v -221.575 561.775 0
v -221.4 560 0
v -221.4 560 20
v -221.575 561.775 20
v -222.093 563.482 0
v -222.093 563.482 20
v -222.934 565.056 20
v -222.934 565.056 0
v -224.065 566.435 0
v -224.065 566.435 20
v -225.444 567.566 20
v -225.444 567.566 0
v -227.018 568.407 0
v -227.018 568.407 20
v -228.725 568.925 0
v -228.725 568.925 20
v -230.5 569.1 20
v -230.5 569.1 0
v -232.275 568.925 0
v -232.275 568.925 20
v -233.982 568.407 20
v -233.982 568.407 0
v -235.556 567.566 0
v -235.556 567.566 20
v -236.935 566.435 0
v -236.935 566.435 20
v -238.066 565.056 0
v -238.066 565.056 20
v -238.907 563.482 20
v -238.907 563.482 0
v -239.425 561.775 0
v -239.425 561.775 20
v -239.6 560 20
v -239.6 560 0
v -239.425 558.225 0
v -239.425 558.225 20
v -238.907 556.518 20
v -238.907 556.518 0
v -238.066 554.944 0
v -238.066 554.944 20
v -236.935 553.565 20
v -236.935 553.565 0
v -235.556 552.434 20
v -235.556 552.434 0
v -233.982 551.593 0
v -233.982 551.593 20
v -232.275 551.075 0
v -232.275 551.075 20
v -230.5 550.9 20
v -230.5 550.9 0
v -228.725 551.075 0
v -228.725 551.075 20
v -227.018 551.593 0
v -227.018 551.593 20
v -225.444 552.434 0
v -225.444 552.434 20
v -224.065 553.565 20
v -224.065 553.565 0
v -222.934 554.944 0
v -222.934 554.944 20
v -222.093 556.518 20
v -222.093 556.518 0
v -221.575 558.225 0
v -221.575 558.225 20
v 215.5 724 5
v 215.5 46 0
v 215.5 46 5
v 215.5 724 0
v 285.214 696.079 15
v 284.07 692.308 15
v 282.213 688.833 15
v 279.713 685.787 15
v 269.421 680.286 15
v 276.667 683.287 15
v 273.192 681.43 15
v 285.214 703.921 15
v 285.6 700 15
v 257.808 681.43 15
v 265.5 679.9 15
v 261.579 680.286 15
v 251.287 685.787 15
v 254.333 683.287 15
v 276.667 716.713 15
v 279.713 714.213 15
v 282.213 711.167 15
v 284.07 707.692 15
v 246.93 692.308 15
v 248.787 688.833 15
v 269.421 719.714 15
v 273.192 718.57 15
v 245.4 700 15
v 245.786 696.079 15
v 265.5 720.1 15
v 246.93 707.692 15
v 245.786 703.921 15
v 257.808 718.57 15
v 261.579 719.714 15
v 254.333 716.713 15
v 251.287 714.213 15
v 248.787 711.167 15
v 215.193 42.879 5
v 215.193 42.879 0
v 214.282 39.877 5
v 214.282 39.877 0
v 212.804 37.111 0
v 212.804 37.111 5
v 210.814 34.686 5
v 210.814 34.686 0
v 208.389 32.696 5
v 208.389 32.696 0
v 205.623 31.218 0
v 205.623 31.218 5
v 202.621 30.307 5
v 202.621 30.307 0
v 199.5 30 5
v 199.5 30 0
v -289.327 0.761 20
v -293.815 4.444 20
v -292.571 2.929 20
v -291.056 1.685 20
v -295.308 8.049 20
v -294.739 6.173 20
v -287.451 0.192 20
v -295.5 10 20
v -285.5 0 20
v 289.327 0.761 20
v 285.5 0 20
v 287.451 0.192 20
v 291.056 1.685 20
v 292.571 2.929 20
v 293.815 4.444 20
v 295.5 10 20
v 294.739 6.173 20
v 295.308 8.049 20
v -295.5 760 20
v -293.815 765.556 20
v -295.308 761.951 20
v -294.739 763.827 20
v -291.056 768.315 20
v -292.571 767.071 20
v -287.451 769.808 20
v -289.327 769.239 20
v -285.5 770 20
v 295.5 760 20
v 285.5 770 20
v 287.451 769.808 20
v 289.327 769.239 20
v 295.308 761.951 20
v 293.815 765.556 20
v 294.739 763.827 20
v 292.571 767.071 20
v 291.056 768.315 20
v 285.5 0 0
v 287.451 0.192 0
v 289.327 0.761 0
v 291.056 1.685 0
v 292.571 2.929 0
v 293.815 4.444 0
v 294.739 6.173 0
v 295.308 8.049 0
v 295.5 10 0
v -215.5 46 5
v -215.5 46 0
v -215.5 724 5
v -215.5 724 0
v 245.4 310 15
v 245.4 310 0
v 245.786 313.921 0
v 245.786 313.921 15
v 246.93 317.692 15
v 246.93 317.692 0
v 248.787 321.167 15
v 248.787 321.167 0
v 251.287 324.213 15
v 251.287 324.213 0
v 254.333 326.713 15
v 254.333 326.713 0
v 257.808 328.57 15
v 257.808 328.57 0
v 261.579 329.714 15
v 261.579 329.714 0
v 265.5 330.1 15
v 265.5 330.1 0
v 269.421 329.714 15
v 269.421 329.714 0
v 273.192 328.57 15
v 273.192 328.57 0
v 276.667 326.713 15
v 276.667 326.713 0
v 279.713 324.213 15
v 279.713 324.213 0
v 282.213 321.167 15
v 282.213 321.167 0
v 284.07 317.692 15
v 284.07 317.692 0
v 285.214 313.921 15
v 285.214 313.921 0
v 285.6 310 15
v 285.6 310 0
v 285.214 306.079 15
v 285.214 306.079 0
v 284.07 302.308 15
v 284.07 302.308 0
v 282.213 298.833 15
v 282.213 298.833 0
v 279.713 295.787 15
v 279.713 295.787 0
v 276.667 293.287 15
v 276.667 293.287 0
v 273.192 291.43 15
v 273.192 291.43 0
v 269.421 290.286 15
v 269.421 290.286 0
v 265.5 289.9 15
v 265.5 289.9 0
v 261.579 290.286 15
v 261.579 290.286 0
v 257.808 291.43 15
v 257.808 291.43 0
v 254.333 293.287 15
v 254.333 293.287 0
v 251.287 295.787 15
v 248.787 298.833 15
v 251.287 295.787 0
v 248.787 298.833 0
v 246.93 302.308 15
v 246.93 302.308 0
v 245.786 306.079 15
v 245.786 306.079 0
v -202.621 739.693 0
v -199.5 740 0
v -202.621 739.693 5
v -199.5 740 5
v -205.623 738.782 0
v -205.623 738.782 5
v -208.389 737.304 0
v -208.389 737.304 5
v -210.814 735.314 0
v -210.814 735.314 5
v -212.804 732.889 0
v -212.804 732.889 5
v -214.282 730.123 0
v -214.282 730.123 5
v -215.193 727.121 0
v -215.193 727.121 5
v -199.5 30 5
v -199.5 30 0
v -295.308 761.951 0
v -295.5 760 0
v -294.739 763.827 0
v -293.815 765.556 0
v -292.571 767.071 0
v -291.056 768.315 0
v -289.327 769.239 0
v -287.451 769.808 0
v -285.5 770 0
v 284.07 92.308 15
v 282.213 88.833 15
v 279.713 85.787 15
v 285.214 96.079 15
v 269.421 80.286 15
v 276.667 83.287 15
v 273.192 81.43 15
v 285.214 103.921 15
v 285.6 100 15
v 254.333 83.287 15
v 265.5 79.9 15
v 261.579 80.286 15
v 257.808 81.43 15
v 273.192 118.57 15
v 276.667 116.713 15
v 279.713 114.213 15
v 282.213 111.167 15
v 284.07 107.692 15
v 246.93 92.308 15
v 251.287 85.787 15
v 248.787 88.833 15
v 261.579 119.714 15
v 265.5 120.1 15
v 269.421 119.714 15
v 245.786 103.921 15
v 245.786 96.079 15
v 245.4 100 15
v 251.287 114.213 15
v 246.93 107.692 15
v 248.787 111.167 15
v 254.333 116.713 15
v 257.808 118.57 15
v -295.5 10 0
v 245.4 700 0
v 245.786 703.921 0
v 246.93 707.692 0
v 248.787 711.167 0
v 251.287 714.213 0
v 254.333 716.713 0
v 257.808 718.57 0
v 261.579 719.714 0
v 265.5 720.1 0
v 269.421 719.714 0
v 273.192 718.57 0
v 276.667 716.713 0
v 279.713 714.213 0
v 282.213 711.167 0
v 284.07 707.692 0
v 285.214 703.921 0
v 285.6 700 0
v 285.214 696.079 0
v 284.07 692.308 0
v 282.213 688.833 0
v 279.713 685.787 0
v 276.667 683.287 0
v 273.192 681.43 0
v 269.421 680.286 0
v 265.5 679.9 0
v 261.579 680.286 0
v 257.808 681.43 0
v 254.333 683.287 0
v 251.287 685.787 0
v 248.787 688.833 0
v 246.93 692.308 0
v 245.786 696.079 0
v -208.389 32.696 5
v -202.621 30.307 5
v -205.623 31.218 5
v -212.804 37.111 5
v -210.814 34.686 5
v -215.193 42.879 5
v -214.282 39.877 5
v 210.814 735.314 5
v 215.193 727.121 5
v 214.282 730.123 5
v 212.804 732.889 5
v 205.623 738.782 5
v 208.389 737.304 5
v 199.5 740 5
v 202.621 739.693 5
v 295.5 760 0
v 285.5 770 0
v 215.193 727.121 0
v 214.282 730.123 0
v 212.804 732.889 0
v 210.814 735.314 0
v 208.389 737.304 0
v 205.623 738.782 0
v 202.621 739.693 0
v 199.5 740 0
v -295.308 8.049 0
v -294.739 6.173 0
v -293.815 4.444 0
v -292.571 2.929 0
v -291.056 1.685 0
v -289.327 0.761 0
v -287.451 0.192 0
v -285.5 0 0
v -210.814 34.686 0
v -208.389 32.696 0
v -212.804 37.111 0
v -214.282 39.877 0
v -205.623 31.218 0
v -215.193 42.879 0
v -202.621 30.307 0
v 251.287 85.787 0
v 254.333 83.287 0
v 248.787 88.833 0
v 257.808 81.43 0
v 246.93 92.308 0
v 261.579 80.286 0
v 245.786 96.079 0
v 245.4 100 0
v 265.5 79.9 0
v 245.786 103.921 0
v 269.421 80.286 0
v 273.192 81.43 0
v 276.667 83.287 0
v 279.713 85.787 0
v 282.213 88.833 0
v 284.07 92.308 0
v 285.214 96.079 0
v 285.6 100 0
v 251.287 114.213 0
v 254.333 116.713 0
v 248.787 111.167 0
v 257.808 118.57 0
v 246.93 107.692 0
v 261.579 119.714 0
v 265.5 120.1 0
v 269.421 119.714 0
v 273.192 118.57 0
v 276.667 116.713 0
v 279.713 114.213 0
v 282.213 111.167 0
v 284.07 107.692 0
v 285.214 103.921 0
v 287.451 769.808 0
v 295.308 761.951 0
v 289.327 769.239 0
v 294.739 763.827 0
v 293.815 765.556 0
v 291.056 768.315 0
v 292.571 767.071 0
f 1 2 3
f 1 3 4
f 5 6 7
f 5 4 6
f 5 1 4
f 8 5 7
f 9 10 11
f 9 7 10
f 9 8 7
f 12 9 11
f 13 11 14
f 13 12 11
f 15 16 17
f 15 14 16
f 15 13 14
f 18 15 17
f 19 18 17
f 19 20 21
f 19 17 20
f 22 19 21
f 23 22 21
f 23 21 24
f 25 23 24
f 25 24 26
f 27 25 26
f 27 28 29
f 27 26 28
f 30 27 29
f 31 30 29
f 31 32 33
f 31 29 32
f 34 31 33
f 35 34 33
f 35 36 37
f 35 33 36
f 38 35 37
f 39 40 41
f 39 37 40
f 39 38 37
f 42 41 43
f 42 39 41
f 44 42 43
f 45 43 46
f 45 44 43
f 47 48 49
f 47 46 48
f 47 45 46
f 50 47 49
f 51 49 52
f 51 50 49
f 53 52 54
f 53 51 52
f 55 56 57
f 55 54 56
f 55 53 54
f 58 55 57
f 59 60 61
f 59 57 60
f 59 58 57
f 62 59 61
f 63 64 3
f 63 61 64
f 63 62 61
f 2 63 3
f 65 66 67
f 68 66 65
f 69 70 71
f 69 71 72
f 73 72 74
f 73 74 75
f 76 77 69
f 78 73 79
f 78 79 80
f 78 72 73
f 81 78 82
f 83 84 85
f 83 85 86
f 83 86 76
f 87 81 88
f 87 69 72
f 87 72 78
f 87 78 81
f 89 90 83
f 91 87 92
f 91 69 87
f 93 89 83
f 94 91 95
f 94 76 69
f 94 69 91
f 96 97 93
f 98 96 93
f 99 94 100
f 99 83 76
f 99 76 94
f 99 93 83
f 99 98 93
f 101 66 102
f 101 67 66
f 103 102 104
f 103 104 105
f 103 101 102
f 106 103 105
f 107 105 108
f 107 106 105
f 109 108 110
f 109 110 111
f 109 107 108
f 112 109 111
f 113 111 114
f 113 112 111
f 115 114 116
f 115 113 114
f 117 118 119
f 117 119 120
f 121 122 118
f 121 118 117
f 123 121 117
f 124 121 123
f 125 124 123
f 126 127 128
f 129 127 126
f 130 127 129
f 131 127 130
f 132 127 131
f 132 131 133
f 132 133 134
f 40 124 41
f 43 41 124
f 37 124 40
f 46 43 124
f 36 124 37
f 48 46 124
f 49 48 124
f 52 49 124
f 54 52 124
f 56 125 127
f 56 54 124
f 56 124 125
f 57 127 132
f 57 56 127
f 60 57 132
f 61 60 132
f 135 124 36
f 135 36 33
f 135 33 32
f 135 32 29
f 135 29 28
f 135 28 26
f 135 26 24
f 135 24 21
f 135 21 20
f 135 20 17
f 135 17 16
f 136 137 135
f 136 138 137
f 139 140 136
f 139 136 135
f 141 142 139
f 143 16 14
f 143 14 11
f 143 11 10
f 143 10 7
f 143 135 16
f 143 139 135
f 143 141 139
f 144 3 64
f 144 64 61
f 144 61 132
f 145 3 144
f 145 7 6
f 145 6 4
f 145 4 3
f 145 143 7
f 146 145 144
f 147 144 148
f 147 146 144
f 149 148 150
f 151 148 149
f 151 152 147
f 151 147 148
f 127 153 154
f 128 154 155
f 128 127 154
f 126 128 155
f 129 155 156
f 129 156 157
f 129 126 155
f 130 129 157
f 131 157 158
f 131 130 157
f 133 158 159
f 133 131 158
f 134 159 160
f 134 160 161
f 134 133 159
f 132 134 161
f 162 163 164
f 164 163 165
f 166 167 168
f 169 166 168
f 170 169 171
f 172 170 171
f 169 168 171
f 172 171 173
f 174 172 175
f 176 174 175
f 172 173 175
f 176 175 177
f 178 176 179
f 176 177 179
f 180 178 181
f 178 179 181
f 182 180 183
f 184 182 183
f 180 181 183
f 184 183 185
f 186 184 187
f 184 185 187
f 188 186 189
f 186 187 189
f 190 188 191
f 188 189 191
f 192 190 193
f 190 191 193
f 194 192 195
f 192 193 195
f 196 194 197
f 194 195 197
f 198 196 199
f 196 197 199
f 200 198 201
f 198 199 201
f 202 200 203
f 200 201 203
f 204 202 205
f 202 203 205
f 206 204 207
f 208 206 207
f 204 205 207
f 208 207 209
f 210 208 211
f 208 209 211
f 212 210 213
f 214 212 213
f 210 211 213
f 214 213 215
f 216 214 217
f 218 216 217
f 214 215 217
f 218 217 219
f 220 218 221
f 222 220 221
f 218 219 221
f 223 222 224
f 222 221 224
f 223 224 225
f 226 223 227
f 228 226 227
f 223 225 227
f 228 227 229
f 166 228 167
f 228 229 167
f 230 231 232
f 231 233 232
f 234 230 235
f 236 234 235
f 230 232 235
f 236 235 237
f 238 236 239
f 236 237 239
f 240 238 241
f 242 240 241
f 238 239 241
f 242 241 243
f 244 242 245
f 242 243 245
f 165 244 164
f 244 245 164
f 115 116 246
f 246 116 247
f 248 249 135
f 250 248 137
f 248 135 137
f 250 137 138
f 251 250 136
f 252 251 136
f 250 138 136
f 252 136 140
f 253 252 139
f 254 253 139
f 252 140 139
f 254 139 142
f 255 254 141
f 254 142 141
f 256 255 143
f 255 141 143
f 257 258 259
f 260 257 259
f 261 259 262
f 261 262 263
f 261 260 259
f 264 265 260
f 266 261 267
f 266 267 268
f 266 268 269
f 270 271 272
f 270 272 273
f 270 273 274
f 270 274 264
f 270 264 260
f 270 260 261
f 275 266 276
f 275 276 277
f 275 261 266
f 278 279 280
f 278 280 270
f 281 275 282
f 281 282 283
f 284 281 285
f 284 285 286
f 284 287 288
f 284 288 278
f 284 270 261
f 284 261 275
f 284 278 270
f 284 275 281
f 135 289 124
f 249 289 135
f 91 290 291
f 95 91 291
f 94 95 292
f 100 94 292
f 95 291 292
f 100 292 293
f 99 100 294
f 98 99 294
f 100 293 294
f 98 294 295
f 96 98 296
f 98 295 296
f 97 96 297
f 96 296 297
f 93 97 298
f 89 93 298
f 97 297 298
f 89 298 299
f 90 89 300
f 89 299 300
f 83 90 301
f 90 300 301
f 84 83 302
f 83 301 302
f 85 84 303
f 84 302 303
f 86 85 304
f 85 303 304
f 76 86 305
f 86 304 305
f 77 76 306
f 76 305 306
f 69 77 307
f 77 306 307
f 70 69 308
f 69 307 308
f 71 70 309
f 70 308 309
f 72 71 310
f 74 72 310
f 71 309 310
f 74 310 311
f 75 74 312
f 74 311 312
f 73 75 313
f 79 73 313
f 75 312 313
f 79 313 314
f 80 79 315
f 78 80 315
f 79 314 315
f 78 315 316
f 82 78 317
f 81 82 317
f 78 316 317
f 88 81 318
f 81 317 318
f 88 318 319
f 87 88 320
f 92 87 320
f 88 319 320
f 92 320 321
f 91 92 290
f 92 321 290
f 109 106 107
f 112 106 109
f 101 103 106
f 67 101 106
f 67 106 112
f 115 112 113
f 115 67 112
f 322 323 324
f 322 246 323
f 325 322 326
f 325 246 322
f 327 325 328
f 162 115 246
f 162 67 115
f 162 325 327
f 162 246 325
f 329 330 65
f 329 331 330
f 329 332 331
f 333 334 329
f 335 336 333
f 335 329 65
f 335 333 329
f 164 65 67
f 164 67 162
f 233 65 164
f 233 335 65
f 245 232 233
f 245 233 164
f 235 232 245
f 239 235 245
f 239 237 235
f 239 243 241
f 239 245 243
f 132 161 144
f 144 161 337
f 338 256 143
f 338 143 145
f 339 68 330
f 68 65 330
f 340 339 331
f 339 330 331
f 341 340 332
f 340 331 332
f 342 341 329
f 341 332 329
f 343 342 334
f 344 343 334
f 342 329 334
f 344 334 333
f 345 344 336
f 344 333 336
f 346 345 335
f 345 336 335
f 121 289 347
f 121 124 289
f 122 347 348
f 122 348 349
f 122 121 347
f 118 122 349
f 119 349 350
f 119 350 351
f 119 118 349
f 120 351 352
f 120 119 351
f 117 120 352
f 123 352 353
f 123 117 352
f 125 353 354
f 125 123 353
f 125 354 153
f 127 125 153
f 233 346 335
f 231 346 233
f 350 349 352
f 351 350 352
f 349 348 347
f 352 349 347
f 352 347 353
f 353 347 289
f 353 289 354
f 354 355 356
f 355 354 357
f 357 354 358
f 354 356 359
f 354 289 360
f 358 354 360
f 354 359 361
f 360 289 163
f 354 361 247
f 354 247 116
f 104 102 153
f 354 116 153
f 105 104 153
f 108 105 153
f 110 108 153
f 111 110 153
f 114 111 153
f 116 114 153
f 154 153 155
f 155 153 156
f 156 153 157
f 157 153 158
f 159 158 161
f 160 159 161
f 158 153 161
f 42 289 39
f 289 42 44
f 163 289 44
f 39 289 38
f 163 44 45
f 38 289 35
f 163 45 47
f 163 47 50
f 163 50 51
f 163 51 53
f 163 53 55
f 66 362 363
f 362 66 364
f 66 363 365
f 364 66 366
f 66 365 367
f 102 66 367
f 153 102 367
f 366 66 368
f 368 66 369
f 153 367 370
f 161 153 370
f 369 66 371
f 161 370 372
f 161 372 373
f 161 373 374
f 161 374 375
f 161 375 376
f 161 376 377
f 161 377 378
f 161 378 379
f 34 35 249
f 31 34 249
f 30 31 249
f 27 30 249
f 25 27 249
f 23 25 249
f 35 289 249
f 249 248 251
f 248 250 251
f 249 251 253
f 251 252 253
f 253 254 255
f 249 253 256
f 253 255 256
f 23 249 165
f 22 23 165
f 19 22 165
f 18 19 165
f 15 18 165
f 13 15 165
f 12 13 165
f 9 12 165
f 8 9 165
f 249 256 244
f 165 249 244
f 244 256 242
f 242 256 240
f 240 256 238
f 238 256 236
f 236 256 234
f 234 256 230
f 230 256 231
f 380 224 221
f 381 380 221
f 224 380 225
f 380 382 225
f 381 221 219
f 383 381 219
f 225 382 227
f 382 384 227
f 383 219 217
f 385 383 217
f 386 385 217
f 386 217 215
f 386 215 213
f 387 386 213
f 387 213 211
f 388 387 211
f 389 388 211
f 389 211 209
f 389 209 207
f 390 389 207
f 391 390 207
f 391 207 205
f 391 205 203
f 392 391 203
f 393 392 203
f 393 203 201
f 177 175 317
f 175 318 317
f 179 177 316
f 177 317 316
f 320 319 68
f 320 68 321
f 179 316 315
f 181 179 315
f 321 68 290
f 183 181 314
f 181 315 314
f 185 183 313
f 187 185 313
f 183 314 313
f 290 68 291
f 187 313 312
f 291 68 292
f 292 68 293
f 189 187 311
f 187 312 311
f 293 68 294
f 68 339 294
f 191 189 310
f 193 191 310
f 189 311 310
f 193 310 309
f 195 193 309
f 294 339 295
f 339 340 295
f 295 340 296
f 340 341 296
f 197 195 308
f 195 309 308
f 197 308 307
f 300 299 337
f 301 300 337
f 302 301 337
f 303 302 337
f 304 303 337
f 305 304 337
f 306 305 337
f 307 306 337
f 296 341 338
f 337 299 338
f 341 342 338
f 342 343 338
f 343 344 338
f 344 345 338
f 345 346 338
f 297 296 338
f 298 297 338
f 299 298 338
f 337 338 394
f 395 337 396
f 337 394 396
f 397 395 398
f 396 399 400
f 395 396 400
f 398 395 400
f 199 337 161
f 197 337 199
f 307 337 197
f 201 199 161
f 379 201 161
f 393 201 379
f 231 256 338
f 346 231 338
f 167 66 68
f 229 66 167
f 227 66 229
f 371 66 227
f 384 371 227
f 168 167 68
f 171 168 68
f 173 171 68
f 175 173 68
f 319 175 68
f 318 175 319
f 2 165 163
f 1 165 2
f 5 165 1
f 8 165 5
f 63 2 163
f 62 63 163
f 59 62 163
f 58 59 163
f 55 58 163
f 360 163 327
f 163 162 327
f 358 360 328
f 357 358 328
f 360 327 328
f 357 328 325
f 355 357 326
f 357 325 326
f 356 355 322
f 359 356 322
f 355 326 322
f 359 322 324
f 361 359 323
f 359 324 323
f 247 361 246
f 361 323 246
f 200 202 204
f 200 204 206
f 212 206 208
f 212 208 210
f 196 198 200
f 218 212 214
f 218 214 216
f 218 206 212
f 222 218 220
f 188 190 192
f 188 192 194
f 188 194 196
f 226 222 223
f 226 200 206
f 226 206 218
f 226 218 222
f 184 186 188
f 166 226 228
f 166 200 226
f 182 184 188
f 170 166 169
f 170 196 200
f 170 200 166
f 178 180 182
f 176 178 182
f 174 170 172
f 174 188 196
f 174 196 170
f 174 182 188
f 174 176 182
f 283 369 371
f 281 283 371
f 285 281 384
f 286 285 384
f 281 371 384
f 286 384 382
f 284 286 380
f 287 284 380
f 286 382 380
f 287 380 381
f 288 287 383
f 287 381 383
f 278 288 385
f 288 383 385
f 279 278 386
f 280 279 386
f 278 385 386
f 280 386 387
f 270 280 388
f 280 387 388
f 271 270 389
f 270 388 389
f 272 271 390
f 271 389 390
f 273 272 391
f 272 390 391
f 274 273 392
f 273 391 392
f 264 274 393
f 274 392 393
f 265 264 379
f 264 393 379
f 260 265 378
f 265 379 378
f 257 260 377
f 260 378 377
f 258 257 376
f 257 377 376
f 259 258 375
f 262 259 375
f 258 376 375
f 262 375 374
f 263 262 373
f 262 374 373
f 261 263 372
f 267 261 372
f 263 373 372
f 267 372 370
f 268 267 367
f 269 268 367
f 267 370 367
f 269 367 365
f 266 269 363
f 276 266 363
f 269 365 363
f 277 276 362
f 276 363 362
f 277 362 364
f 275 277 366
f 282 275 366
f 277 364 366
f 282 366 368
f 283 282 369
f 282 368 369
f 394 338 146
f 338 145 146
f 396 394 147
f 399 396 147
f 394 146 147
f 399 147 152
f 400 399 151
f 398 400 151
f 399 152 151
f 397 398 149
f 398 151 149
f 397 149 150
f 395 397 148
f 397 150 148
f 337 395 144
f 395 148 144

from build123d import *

# Parameters (mm, degrees)
SKETCH_1_W               = 591
SKETCH_1_H               = 770
EXTRUDE_1_DEPTH          = 20
CUT_EXTRUDE_1_DEPTH      = 825.997121207
CUT_EXTRUDE_1_DEPTH_BACK = 825.997121207
SKETCH_2_R               = 9.1
FILLET_1_R               = 10
SKETCH_4_R               = 20.1
CUT_EXTRUDE_3_DEPTH      = 15
SKETCH_5_W               = 431
SKETCH_5_H               = 710
CUT_EXTRUDE_4_DEPTH      = 5
FILLET_2_R               = 16


with BuildPart() as part:
    # 草图1 → 凸台-拉伸1 (new body)
    with BuildSketch(Plane.XY):
        with Locations((0, 385)):
            Rectangle(SKETCH_1_W, SKETCH_1_H)
    extrude(amount=EXTRUDE_1_DEPTH)

    # 草图2 → 切除-拉伸1 (cut, two sides: drawn at the far end of the back side and taken through both)
    with BuildSketch(Plane.XY.offset(20).offset(-CUT_EXTRUDE_1_DEPTH_BACK)):
        with Locations((-230.5, 560)):
            Circle(SKETCH_2_R)
    extrude(amount=CUT_EXTRUDE_1_DEPTH + CUT_EXTRUDE_1_DEPTH_BACK, mode=Mode.SUBTRACT)

    # 圆角1
    fillet_1_edges = [part.edges().sort_by_distance(p)[0] for p in [
        (-295.5, 770, 10),
        (295.5, 770, 10),
        (295.5, 0, 10),
        (-295.5, 0, 10),
    ]]
    fillet(fillet_1_edges, radius=FILLET_1_R)

    # 草图4 → 切除-拉伸3 (cut)
    with BuildSketch(Plane(origin=(0, 0, 0), x_dir=(-1, 0, 0), z_dir=(0, 0, -1))):
        with Locations((-265.5, 700)):
            Circle(SKETCH_4_R)
        with Locations((-265.5, 310)):
            Circle(SKETCH_4_R)
        with Locations((-265.5, 100)):
            Circle(SKETCH_4_R)
    extrude(amount=-CUT_EXTRUDE_3_DEPTH, mode=Mode.SUBTRACT)

    # 草图5 → 切除-拉伸4 (cut)
    with BuildSketch(Plane(origin=(0, 0, 0), x_dir=(-1, 0, 0), z_dir=(0, 0, -1))):
        with Locations((0, 385)):
            Rectangle(SKETCH_5_W, SKETCH_5_H)
    extrude(amount=-CUT_EXTRUDE_4_DEPTH, mode=Mode.SUBTRACT)

    # 圆角2
    fillet_2_edges = [part.edges().sort_by_distance(p)[0] for p in [
        (215.5, 30, 2.5),
        (215.5, 740, 2.5),
        (-215.5, 740, 2.5),
        (-215.5, 30, 2.5),
    ]]
    fillet(fillet_2_edges, radius=FILLET_2_R)


solid = part.part
